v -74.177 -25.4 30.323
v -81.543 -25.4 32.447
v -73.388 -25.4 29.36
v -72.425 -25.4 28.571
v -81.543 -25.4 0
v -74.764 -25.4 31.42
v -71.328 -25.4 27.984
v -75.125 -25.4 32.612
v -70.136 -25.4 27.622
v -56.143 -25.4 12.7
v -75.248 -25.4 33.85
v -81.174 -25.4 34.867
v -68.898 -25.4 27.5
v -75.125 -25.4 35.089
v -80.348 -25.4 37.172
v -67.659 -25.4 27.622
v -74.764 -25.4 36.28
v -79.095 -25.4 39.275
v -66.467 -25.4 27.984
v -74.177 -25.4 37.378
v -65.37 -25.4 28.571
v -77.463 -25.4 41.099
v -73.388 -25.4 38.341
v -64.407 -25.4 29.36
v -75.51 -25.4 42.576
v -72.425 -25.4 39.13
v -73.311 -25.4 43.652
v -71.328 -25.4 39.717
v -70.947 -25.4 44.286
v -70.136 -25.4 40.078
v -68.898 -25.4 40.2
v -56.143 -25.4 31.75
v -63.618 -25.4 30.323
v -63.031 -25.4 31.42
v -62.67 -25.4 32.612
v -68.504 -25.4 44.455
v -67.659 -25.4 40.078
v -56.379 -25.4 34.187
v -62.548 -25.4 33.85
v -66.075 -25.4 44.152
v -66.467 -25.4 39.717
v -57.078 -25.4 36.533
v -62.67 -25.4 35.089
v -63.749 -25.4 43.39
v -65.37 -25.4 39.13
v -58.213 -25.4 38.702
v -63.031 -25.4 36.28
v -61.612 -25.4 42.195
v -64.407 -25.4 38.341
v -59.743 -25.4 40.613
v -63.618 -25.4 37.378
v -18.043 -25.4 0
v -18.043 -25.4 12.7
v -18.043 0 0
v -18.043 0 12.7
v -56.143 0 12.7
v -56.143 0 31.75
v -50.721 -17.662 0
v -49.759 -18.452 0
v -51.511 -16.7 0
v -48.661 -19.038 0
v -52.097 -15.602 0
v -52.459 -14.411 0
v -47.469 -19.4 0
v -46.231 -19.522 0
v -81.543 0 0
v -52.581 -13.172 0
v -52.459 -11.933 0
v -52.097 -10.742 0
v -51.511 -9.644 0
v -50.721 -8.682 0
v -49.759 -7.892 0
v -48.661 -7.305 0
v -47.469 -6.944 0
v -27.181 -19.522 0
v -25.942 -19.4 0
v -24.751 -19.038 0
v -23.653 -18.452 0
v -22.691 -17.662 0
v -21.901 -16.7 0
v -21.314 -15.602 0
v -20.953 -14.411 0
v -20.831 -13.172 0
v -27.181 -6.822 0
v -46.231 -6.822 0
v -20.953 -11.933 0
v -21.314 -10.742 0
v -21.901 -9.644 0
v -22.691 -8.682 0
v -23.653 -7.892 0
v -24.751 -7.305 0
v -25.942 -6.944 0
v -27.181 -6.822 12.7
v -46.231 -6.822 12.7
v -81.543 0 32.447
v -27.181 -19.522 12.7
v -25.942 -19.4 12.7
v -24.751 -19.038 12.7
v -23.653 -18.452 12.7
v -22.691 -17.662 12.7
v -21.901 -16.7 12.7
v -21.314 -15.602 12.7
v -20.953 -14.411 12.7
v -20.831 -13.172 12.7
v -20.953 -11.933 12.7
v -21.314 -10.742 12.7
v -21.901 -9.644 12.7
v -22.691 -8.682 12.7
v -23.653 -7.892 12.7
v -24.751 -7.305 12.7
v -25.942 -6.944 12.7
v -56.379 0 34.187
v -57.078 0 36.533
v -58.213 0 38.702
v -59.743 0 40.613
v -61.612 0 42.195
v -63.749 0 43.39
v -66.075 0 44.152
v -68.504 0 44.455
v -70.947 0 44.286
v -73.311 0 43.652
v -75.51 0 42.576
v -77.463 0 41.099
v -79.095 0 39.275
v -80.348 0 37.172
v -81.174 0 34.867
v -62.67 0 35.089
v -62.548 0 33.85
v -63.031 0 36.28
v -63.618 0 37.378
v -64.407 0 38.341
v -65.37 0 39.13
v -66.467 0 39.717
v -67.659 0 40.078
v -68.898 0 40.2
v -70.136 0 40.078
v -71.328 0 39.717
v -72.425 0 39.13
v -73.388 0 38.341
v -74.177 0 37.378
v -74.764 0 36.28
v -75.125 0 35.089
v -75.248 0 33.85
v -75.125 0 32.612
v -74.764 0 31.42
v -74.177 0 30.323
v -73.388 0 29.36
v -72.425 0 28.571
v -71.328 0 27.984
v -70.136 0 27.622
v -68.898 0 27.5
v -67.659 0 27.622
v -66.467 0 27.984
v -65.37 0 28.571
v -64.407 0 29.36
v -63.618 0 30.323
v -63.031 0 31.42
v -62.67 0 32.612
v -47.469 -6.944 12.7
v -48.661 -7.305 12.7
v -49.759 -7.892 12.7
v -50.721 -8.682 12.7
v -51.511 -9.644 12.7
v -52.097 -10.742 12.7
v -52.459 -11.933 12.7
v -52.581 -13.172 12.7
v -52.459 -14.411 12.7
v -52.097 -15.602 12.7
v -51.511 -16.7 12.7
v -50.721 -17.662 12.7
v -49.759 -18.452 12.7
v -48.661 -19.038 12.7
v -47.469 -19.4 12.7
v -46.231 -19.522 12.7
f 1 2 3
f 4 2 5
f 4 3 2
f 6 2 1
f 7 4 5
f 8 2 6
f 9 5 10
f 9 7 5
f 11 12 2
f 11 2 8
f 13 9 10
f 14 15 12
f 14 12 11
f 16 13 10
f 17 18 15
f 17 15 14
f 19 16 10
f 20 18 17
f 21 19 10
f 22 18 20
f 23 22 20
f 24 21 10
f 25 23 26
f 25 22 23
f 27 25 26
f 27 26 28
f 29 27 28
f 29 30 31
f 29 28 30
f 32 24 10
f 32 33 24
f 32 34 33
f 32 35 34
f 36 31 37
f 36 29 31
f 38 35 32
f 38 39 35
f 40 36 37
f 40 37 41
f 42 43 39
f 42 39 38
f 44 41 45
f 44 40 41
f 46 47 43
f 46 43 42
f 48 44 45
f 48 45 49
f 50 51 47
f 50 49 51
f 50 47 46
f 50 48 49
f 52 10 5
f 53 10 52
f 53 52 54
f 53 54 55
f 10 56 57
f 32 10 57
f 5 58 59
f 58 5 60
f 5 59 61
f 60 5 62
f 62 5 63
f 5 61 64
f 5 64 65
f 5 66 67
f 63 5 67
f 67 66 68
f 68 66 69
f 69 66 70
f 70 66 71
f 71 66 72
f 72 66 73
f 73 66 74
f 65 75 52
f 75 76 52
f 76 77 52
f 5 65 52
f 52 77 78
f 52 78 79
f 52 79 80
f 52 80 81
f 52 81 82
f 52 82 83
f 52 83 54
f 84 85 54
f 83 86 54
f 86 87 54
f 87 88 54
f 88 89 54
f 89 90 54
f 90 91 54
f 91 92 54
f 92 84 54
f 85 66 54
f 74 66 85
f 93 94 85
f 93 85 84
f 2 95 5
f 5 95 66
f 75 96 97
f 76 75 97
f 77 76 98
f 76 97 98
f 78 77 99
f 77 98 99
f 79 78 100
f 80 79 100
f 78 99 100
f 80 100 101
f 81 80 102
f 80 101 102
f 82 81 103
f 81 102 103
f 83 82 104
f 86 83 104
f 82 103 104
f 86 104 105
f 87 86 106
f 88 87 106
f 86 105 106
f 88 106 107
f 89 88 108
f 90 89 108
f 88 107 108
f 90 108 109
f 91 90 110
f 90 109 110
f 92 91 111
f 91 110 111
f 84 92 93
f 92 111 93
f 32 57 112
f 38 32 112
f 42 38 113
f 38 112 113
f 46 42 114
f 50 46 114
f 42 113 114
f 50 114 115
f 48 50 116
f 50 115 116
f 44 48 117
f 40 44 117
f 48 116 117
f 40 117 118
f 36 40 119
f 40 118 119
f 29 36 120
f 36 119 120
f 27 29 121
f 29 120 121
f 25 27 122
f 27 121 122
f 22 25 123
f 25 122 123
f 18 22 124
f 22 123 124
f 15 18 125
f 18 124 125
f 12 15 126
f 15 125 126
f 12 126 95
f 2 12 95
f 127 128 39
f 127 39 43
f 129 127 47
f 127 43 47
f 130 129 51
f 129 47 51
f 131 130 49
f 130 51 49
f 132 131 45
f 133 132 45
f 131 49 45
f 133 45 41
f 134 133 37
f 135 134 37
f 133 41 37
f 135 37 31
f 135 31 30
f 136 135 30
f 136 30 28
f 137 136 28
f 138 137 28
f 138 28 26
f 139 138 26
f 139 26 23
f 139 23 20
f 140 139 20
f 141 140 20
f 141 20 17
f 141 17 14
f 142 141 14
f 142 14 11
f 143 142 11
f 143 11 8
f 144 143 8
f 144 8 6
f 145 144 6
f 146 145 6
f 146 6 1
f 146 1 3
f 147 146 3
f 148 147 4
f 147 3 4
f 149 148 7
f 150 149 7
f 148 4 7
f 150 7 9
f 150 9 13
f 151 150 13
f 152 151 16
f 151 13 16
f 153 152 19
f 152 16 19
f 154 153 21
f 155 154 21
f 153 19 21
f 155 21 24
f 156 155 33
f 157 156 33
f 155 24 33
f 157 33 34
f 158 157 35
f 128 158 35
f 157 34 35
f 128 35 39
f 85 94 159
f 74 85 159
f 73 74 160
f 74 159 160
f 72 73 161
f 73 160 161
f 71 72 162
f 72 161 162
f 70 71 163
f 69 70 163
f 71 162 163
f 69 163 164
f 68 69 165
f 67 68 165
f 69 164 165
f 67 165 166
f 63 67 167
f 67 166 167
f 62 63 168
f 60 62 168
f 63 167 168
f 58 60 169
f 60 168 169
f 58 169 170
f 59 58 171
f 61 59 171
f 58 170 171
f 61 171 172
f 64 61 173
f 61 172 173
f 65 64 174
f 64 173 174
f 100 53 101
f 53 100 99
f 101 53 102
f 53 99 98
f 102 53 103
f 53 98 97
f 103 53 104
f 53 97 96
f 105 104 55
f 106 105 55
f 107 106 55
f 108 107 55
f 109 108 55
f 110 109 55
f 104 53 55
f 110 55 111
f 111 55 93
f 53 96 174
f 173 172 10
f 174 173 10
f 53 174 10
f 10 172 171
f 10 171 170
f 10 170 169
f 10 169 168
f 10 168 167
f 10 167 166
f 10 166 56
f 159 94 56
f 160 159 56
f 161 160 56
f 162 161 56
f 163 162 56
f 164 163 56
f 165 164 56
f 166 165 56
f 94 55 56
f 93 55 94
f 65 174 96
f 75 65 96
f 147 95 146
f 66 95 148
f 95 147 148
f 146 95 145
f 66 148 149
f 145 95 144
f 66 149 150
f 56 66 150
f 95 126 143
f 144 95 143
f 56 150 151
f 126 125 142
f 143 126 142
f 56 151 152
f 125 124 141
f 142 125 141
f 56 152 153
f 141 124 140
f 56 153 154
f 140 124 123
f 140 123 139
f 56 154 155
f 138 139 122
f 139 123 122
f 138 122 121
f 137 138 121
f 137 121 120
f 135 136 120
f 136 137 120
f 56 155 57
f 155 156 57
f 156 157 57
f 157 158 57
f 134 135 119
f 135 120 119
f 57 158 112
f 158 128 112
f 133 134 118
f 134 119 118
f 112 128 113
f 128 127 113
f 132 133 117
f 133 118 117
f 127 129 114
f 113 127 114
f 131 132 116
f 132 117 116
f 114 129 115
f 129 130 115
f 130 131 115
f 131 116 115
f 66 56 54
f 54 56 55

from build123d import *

# Parameters (mm, degrees)
F1_DEPTH = 25.4
F2_R     = 6.35
F3_DEPTH = 25.401
F4_W     = 19.05
F4_H     = 12.7
F5_DEPTH = 12.701
F7_DEPTH = 12.701
F9_DEPTH = 12.701


with BuildPart() as f1:
    # F0 (on Front) → F1 (new body)
    with BuildSketch(Plane.XZ):
        with BuildLine():
            ThreePointArc((-56.1432969581, 31.75), (-68.5042506108, 44.4547800567), (-81.5432969581, 32.4469541982))
            Line((-81.5432969581, 32.4469541982), (-81.5432969581, 0))
            Line((-81.5432969581, 0), (-18.0432969581, 0))
            Line((-18.0432969581, 0), (-18.0432969581, 12.7))
            Line((-18.0432969581, 12.7), (-56.1432969581, 12.7))
            Line((-56.1432969581, 12.7), (-56.1432969581, 31.75))
        make_face()
    extrude(amount=F1_DEPTH)

    # F2 (on face) → F3 (cut, through all)
    with BuildSketch(Plane.XZ.offset(25.4)):
        with Locations((-68.8975006342, 33.8503867388)):
            Circle(F2_R)
    extrude(amount=-F3_DEPTH, mode=Mode.SUBTRACT)

    # F4 (on face) → F5 (cut, through all)
    with BuildSketch(Plane.XY.offset(12.7)):
        with Locations((-36.7056755349, -13.1718035824)):
            Rectangle(F4_W, F4_H)
    extrude(amount=-F5_DEPTH, mode=Mode.SUBTRACT)

    # F6 (on face) → F7 (cut, through all)
    with BuildSketch(Plane.XY.offset(12.7)):
        with BuildLine():
            Line((-46.2306755349, -19.5218035824), (-46.2306755349, -6.8218035824))
            ThreePointArc((-46.2306755349, -6.8218035824), (-52.5806755349, -13.1718035824), (-46.2306755349, -19.5218035824))
        make_face()
    extrude(amount=-F7_DEPTH, mode=Mode.SUBTRACT)

    # F8 (on face) → F9 (cut, through all)
    with BuildSketch(Plane.XY.offset(12.7)):
        with BuildLine():
            Line((-27.1806755349, -6.8218035824), (-27.1806755349, -19.5218035824))
            ThreePointArc((-27.1806755349, -19.5218035824), (-20.8306755349, -13.1718035824), (-27.1806755349, -6.8218035824))
        make_face()
    extrude(amount=-F9_DEPTH, mode=Mode.SUBTRACT)


solid = f1.part
